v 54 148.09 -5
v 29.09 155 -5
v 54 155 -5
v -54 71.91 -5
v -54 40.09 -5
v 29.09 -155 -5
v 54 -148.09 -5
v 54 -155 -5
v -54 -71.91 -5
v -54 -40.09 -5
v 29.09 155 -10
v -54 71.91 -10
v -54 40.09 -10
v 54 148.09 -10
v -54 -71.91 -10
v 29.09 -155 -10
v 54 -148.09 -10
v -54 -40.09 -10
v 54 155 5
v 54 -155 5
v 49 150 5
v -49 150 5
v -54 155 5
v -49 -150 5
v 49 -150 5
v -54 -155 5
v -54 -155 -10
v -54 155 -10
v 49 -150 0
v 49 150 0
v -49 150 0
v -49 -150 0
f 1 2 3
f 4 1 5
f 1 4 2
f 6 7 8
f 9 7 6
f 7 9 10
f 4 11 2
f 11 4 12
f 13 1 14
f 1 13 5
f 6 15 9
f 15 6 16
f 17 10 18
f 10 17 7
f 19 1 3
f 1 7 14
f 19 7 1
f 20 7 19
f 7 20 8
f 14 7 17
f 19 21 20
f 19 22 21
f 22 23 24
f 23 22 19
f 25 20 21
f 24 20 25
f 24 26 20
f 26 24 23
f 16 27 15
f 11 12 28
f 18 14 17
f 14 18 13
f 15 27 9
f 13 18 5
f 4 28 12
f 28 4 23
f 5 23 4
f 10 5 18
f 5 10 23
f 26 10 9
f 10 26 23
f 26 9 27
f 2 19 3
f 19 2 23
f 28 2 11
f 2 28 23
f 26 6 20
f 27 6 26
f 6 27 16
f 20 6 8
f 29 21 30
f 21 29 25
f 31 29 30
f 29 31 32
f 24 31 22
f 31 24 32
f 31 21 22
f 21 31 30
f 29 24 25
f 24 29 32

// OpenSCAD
upsFootprint = [98,300,150];

barThickness = 22.5;

module bars(){
    translate([-110,0,(barThickness/-2)-5])rotate(45){
        cube([600,barThickness,barThickness], center=true);
        rotate(90)cube([600,barThickness,barThickness], center=true);
    }
}

//bars();

difference(){
    translate([0,0,-2.5])cube([upsFootprint.x,upsFootprint.y,15]+[10,10,0], center=true);
    translate([0,0,upsFootprint.z/2])cube(upsFootprint, center=true);
        bars();
}


if($preview){
    #bars();
}
